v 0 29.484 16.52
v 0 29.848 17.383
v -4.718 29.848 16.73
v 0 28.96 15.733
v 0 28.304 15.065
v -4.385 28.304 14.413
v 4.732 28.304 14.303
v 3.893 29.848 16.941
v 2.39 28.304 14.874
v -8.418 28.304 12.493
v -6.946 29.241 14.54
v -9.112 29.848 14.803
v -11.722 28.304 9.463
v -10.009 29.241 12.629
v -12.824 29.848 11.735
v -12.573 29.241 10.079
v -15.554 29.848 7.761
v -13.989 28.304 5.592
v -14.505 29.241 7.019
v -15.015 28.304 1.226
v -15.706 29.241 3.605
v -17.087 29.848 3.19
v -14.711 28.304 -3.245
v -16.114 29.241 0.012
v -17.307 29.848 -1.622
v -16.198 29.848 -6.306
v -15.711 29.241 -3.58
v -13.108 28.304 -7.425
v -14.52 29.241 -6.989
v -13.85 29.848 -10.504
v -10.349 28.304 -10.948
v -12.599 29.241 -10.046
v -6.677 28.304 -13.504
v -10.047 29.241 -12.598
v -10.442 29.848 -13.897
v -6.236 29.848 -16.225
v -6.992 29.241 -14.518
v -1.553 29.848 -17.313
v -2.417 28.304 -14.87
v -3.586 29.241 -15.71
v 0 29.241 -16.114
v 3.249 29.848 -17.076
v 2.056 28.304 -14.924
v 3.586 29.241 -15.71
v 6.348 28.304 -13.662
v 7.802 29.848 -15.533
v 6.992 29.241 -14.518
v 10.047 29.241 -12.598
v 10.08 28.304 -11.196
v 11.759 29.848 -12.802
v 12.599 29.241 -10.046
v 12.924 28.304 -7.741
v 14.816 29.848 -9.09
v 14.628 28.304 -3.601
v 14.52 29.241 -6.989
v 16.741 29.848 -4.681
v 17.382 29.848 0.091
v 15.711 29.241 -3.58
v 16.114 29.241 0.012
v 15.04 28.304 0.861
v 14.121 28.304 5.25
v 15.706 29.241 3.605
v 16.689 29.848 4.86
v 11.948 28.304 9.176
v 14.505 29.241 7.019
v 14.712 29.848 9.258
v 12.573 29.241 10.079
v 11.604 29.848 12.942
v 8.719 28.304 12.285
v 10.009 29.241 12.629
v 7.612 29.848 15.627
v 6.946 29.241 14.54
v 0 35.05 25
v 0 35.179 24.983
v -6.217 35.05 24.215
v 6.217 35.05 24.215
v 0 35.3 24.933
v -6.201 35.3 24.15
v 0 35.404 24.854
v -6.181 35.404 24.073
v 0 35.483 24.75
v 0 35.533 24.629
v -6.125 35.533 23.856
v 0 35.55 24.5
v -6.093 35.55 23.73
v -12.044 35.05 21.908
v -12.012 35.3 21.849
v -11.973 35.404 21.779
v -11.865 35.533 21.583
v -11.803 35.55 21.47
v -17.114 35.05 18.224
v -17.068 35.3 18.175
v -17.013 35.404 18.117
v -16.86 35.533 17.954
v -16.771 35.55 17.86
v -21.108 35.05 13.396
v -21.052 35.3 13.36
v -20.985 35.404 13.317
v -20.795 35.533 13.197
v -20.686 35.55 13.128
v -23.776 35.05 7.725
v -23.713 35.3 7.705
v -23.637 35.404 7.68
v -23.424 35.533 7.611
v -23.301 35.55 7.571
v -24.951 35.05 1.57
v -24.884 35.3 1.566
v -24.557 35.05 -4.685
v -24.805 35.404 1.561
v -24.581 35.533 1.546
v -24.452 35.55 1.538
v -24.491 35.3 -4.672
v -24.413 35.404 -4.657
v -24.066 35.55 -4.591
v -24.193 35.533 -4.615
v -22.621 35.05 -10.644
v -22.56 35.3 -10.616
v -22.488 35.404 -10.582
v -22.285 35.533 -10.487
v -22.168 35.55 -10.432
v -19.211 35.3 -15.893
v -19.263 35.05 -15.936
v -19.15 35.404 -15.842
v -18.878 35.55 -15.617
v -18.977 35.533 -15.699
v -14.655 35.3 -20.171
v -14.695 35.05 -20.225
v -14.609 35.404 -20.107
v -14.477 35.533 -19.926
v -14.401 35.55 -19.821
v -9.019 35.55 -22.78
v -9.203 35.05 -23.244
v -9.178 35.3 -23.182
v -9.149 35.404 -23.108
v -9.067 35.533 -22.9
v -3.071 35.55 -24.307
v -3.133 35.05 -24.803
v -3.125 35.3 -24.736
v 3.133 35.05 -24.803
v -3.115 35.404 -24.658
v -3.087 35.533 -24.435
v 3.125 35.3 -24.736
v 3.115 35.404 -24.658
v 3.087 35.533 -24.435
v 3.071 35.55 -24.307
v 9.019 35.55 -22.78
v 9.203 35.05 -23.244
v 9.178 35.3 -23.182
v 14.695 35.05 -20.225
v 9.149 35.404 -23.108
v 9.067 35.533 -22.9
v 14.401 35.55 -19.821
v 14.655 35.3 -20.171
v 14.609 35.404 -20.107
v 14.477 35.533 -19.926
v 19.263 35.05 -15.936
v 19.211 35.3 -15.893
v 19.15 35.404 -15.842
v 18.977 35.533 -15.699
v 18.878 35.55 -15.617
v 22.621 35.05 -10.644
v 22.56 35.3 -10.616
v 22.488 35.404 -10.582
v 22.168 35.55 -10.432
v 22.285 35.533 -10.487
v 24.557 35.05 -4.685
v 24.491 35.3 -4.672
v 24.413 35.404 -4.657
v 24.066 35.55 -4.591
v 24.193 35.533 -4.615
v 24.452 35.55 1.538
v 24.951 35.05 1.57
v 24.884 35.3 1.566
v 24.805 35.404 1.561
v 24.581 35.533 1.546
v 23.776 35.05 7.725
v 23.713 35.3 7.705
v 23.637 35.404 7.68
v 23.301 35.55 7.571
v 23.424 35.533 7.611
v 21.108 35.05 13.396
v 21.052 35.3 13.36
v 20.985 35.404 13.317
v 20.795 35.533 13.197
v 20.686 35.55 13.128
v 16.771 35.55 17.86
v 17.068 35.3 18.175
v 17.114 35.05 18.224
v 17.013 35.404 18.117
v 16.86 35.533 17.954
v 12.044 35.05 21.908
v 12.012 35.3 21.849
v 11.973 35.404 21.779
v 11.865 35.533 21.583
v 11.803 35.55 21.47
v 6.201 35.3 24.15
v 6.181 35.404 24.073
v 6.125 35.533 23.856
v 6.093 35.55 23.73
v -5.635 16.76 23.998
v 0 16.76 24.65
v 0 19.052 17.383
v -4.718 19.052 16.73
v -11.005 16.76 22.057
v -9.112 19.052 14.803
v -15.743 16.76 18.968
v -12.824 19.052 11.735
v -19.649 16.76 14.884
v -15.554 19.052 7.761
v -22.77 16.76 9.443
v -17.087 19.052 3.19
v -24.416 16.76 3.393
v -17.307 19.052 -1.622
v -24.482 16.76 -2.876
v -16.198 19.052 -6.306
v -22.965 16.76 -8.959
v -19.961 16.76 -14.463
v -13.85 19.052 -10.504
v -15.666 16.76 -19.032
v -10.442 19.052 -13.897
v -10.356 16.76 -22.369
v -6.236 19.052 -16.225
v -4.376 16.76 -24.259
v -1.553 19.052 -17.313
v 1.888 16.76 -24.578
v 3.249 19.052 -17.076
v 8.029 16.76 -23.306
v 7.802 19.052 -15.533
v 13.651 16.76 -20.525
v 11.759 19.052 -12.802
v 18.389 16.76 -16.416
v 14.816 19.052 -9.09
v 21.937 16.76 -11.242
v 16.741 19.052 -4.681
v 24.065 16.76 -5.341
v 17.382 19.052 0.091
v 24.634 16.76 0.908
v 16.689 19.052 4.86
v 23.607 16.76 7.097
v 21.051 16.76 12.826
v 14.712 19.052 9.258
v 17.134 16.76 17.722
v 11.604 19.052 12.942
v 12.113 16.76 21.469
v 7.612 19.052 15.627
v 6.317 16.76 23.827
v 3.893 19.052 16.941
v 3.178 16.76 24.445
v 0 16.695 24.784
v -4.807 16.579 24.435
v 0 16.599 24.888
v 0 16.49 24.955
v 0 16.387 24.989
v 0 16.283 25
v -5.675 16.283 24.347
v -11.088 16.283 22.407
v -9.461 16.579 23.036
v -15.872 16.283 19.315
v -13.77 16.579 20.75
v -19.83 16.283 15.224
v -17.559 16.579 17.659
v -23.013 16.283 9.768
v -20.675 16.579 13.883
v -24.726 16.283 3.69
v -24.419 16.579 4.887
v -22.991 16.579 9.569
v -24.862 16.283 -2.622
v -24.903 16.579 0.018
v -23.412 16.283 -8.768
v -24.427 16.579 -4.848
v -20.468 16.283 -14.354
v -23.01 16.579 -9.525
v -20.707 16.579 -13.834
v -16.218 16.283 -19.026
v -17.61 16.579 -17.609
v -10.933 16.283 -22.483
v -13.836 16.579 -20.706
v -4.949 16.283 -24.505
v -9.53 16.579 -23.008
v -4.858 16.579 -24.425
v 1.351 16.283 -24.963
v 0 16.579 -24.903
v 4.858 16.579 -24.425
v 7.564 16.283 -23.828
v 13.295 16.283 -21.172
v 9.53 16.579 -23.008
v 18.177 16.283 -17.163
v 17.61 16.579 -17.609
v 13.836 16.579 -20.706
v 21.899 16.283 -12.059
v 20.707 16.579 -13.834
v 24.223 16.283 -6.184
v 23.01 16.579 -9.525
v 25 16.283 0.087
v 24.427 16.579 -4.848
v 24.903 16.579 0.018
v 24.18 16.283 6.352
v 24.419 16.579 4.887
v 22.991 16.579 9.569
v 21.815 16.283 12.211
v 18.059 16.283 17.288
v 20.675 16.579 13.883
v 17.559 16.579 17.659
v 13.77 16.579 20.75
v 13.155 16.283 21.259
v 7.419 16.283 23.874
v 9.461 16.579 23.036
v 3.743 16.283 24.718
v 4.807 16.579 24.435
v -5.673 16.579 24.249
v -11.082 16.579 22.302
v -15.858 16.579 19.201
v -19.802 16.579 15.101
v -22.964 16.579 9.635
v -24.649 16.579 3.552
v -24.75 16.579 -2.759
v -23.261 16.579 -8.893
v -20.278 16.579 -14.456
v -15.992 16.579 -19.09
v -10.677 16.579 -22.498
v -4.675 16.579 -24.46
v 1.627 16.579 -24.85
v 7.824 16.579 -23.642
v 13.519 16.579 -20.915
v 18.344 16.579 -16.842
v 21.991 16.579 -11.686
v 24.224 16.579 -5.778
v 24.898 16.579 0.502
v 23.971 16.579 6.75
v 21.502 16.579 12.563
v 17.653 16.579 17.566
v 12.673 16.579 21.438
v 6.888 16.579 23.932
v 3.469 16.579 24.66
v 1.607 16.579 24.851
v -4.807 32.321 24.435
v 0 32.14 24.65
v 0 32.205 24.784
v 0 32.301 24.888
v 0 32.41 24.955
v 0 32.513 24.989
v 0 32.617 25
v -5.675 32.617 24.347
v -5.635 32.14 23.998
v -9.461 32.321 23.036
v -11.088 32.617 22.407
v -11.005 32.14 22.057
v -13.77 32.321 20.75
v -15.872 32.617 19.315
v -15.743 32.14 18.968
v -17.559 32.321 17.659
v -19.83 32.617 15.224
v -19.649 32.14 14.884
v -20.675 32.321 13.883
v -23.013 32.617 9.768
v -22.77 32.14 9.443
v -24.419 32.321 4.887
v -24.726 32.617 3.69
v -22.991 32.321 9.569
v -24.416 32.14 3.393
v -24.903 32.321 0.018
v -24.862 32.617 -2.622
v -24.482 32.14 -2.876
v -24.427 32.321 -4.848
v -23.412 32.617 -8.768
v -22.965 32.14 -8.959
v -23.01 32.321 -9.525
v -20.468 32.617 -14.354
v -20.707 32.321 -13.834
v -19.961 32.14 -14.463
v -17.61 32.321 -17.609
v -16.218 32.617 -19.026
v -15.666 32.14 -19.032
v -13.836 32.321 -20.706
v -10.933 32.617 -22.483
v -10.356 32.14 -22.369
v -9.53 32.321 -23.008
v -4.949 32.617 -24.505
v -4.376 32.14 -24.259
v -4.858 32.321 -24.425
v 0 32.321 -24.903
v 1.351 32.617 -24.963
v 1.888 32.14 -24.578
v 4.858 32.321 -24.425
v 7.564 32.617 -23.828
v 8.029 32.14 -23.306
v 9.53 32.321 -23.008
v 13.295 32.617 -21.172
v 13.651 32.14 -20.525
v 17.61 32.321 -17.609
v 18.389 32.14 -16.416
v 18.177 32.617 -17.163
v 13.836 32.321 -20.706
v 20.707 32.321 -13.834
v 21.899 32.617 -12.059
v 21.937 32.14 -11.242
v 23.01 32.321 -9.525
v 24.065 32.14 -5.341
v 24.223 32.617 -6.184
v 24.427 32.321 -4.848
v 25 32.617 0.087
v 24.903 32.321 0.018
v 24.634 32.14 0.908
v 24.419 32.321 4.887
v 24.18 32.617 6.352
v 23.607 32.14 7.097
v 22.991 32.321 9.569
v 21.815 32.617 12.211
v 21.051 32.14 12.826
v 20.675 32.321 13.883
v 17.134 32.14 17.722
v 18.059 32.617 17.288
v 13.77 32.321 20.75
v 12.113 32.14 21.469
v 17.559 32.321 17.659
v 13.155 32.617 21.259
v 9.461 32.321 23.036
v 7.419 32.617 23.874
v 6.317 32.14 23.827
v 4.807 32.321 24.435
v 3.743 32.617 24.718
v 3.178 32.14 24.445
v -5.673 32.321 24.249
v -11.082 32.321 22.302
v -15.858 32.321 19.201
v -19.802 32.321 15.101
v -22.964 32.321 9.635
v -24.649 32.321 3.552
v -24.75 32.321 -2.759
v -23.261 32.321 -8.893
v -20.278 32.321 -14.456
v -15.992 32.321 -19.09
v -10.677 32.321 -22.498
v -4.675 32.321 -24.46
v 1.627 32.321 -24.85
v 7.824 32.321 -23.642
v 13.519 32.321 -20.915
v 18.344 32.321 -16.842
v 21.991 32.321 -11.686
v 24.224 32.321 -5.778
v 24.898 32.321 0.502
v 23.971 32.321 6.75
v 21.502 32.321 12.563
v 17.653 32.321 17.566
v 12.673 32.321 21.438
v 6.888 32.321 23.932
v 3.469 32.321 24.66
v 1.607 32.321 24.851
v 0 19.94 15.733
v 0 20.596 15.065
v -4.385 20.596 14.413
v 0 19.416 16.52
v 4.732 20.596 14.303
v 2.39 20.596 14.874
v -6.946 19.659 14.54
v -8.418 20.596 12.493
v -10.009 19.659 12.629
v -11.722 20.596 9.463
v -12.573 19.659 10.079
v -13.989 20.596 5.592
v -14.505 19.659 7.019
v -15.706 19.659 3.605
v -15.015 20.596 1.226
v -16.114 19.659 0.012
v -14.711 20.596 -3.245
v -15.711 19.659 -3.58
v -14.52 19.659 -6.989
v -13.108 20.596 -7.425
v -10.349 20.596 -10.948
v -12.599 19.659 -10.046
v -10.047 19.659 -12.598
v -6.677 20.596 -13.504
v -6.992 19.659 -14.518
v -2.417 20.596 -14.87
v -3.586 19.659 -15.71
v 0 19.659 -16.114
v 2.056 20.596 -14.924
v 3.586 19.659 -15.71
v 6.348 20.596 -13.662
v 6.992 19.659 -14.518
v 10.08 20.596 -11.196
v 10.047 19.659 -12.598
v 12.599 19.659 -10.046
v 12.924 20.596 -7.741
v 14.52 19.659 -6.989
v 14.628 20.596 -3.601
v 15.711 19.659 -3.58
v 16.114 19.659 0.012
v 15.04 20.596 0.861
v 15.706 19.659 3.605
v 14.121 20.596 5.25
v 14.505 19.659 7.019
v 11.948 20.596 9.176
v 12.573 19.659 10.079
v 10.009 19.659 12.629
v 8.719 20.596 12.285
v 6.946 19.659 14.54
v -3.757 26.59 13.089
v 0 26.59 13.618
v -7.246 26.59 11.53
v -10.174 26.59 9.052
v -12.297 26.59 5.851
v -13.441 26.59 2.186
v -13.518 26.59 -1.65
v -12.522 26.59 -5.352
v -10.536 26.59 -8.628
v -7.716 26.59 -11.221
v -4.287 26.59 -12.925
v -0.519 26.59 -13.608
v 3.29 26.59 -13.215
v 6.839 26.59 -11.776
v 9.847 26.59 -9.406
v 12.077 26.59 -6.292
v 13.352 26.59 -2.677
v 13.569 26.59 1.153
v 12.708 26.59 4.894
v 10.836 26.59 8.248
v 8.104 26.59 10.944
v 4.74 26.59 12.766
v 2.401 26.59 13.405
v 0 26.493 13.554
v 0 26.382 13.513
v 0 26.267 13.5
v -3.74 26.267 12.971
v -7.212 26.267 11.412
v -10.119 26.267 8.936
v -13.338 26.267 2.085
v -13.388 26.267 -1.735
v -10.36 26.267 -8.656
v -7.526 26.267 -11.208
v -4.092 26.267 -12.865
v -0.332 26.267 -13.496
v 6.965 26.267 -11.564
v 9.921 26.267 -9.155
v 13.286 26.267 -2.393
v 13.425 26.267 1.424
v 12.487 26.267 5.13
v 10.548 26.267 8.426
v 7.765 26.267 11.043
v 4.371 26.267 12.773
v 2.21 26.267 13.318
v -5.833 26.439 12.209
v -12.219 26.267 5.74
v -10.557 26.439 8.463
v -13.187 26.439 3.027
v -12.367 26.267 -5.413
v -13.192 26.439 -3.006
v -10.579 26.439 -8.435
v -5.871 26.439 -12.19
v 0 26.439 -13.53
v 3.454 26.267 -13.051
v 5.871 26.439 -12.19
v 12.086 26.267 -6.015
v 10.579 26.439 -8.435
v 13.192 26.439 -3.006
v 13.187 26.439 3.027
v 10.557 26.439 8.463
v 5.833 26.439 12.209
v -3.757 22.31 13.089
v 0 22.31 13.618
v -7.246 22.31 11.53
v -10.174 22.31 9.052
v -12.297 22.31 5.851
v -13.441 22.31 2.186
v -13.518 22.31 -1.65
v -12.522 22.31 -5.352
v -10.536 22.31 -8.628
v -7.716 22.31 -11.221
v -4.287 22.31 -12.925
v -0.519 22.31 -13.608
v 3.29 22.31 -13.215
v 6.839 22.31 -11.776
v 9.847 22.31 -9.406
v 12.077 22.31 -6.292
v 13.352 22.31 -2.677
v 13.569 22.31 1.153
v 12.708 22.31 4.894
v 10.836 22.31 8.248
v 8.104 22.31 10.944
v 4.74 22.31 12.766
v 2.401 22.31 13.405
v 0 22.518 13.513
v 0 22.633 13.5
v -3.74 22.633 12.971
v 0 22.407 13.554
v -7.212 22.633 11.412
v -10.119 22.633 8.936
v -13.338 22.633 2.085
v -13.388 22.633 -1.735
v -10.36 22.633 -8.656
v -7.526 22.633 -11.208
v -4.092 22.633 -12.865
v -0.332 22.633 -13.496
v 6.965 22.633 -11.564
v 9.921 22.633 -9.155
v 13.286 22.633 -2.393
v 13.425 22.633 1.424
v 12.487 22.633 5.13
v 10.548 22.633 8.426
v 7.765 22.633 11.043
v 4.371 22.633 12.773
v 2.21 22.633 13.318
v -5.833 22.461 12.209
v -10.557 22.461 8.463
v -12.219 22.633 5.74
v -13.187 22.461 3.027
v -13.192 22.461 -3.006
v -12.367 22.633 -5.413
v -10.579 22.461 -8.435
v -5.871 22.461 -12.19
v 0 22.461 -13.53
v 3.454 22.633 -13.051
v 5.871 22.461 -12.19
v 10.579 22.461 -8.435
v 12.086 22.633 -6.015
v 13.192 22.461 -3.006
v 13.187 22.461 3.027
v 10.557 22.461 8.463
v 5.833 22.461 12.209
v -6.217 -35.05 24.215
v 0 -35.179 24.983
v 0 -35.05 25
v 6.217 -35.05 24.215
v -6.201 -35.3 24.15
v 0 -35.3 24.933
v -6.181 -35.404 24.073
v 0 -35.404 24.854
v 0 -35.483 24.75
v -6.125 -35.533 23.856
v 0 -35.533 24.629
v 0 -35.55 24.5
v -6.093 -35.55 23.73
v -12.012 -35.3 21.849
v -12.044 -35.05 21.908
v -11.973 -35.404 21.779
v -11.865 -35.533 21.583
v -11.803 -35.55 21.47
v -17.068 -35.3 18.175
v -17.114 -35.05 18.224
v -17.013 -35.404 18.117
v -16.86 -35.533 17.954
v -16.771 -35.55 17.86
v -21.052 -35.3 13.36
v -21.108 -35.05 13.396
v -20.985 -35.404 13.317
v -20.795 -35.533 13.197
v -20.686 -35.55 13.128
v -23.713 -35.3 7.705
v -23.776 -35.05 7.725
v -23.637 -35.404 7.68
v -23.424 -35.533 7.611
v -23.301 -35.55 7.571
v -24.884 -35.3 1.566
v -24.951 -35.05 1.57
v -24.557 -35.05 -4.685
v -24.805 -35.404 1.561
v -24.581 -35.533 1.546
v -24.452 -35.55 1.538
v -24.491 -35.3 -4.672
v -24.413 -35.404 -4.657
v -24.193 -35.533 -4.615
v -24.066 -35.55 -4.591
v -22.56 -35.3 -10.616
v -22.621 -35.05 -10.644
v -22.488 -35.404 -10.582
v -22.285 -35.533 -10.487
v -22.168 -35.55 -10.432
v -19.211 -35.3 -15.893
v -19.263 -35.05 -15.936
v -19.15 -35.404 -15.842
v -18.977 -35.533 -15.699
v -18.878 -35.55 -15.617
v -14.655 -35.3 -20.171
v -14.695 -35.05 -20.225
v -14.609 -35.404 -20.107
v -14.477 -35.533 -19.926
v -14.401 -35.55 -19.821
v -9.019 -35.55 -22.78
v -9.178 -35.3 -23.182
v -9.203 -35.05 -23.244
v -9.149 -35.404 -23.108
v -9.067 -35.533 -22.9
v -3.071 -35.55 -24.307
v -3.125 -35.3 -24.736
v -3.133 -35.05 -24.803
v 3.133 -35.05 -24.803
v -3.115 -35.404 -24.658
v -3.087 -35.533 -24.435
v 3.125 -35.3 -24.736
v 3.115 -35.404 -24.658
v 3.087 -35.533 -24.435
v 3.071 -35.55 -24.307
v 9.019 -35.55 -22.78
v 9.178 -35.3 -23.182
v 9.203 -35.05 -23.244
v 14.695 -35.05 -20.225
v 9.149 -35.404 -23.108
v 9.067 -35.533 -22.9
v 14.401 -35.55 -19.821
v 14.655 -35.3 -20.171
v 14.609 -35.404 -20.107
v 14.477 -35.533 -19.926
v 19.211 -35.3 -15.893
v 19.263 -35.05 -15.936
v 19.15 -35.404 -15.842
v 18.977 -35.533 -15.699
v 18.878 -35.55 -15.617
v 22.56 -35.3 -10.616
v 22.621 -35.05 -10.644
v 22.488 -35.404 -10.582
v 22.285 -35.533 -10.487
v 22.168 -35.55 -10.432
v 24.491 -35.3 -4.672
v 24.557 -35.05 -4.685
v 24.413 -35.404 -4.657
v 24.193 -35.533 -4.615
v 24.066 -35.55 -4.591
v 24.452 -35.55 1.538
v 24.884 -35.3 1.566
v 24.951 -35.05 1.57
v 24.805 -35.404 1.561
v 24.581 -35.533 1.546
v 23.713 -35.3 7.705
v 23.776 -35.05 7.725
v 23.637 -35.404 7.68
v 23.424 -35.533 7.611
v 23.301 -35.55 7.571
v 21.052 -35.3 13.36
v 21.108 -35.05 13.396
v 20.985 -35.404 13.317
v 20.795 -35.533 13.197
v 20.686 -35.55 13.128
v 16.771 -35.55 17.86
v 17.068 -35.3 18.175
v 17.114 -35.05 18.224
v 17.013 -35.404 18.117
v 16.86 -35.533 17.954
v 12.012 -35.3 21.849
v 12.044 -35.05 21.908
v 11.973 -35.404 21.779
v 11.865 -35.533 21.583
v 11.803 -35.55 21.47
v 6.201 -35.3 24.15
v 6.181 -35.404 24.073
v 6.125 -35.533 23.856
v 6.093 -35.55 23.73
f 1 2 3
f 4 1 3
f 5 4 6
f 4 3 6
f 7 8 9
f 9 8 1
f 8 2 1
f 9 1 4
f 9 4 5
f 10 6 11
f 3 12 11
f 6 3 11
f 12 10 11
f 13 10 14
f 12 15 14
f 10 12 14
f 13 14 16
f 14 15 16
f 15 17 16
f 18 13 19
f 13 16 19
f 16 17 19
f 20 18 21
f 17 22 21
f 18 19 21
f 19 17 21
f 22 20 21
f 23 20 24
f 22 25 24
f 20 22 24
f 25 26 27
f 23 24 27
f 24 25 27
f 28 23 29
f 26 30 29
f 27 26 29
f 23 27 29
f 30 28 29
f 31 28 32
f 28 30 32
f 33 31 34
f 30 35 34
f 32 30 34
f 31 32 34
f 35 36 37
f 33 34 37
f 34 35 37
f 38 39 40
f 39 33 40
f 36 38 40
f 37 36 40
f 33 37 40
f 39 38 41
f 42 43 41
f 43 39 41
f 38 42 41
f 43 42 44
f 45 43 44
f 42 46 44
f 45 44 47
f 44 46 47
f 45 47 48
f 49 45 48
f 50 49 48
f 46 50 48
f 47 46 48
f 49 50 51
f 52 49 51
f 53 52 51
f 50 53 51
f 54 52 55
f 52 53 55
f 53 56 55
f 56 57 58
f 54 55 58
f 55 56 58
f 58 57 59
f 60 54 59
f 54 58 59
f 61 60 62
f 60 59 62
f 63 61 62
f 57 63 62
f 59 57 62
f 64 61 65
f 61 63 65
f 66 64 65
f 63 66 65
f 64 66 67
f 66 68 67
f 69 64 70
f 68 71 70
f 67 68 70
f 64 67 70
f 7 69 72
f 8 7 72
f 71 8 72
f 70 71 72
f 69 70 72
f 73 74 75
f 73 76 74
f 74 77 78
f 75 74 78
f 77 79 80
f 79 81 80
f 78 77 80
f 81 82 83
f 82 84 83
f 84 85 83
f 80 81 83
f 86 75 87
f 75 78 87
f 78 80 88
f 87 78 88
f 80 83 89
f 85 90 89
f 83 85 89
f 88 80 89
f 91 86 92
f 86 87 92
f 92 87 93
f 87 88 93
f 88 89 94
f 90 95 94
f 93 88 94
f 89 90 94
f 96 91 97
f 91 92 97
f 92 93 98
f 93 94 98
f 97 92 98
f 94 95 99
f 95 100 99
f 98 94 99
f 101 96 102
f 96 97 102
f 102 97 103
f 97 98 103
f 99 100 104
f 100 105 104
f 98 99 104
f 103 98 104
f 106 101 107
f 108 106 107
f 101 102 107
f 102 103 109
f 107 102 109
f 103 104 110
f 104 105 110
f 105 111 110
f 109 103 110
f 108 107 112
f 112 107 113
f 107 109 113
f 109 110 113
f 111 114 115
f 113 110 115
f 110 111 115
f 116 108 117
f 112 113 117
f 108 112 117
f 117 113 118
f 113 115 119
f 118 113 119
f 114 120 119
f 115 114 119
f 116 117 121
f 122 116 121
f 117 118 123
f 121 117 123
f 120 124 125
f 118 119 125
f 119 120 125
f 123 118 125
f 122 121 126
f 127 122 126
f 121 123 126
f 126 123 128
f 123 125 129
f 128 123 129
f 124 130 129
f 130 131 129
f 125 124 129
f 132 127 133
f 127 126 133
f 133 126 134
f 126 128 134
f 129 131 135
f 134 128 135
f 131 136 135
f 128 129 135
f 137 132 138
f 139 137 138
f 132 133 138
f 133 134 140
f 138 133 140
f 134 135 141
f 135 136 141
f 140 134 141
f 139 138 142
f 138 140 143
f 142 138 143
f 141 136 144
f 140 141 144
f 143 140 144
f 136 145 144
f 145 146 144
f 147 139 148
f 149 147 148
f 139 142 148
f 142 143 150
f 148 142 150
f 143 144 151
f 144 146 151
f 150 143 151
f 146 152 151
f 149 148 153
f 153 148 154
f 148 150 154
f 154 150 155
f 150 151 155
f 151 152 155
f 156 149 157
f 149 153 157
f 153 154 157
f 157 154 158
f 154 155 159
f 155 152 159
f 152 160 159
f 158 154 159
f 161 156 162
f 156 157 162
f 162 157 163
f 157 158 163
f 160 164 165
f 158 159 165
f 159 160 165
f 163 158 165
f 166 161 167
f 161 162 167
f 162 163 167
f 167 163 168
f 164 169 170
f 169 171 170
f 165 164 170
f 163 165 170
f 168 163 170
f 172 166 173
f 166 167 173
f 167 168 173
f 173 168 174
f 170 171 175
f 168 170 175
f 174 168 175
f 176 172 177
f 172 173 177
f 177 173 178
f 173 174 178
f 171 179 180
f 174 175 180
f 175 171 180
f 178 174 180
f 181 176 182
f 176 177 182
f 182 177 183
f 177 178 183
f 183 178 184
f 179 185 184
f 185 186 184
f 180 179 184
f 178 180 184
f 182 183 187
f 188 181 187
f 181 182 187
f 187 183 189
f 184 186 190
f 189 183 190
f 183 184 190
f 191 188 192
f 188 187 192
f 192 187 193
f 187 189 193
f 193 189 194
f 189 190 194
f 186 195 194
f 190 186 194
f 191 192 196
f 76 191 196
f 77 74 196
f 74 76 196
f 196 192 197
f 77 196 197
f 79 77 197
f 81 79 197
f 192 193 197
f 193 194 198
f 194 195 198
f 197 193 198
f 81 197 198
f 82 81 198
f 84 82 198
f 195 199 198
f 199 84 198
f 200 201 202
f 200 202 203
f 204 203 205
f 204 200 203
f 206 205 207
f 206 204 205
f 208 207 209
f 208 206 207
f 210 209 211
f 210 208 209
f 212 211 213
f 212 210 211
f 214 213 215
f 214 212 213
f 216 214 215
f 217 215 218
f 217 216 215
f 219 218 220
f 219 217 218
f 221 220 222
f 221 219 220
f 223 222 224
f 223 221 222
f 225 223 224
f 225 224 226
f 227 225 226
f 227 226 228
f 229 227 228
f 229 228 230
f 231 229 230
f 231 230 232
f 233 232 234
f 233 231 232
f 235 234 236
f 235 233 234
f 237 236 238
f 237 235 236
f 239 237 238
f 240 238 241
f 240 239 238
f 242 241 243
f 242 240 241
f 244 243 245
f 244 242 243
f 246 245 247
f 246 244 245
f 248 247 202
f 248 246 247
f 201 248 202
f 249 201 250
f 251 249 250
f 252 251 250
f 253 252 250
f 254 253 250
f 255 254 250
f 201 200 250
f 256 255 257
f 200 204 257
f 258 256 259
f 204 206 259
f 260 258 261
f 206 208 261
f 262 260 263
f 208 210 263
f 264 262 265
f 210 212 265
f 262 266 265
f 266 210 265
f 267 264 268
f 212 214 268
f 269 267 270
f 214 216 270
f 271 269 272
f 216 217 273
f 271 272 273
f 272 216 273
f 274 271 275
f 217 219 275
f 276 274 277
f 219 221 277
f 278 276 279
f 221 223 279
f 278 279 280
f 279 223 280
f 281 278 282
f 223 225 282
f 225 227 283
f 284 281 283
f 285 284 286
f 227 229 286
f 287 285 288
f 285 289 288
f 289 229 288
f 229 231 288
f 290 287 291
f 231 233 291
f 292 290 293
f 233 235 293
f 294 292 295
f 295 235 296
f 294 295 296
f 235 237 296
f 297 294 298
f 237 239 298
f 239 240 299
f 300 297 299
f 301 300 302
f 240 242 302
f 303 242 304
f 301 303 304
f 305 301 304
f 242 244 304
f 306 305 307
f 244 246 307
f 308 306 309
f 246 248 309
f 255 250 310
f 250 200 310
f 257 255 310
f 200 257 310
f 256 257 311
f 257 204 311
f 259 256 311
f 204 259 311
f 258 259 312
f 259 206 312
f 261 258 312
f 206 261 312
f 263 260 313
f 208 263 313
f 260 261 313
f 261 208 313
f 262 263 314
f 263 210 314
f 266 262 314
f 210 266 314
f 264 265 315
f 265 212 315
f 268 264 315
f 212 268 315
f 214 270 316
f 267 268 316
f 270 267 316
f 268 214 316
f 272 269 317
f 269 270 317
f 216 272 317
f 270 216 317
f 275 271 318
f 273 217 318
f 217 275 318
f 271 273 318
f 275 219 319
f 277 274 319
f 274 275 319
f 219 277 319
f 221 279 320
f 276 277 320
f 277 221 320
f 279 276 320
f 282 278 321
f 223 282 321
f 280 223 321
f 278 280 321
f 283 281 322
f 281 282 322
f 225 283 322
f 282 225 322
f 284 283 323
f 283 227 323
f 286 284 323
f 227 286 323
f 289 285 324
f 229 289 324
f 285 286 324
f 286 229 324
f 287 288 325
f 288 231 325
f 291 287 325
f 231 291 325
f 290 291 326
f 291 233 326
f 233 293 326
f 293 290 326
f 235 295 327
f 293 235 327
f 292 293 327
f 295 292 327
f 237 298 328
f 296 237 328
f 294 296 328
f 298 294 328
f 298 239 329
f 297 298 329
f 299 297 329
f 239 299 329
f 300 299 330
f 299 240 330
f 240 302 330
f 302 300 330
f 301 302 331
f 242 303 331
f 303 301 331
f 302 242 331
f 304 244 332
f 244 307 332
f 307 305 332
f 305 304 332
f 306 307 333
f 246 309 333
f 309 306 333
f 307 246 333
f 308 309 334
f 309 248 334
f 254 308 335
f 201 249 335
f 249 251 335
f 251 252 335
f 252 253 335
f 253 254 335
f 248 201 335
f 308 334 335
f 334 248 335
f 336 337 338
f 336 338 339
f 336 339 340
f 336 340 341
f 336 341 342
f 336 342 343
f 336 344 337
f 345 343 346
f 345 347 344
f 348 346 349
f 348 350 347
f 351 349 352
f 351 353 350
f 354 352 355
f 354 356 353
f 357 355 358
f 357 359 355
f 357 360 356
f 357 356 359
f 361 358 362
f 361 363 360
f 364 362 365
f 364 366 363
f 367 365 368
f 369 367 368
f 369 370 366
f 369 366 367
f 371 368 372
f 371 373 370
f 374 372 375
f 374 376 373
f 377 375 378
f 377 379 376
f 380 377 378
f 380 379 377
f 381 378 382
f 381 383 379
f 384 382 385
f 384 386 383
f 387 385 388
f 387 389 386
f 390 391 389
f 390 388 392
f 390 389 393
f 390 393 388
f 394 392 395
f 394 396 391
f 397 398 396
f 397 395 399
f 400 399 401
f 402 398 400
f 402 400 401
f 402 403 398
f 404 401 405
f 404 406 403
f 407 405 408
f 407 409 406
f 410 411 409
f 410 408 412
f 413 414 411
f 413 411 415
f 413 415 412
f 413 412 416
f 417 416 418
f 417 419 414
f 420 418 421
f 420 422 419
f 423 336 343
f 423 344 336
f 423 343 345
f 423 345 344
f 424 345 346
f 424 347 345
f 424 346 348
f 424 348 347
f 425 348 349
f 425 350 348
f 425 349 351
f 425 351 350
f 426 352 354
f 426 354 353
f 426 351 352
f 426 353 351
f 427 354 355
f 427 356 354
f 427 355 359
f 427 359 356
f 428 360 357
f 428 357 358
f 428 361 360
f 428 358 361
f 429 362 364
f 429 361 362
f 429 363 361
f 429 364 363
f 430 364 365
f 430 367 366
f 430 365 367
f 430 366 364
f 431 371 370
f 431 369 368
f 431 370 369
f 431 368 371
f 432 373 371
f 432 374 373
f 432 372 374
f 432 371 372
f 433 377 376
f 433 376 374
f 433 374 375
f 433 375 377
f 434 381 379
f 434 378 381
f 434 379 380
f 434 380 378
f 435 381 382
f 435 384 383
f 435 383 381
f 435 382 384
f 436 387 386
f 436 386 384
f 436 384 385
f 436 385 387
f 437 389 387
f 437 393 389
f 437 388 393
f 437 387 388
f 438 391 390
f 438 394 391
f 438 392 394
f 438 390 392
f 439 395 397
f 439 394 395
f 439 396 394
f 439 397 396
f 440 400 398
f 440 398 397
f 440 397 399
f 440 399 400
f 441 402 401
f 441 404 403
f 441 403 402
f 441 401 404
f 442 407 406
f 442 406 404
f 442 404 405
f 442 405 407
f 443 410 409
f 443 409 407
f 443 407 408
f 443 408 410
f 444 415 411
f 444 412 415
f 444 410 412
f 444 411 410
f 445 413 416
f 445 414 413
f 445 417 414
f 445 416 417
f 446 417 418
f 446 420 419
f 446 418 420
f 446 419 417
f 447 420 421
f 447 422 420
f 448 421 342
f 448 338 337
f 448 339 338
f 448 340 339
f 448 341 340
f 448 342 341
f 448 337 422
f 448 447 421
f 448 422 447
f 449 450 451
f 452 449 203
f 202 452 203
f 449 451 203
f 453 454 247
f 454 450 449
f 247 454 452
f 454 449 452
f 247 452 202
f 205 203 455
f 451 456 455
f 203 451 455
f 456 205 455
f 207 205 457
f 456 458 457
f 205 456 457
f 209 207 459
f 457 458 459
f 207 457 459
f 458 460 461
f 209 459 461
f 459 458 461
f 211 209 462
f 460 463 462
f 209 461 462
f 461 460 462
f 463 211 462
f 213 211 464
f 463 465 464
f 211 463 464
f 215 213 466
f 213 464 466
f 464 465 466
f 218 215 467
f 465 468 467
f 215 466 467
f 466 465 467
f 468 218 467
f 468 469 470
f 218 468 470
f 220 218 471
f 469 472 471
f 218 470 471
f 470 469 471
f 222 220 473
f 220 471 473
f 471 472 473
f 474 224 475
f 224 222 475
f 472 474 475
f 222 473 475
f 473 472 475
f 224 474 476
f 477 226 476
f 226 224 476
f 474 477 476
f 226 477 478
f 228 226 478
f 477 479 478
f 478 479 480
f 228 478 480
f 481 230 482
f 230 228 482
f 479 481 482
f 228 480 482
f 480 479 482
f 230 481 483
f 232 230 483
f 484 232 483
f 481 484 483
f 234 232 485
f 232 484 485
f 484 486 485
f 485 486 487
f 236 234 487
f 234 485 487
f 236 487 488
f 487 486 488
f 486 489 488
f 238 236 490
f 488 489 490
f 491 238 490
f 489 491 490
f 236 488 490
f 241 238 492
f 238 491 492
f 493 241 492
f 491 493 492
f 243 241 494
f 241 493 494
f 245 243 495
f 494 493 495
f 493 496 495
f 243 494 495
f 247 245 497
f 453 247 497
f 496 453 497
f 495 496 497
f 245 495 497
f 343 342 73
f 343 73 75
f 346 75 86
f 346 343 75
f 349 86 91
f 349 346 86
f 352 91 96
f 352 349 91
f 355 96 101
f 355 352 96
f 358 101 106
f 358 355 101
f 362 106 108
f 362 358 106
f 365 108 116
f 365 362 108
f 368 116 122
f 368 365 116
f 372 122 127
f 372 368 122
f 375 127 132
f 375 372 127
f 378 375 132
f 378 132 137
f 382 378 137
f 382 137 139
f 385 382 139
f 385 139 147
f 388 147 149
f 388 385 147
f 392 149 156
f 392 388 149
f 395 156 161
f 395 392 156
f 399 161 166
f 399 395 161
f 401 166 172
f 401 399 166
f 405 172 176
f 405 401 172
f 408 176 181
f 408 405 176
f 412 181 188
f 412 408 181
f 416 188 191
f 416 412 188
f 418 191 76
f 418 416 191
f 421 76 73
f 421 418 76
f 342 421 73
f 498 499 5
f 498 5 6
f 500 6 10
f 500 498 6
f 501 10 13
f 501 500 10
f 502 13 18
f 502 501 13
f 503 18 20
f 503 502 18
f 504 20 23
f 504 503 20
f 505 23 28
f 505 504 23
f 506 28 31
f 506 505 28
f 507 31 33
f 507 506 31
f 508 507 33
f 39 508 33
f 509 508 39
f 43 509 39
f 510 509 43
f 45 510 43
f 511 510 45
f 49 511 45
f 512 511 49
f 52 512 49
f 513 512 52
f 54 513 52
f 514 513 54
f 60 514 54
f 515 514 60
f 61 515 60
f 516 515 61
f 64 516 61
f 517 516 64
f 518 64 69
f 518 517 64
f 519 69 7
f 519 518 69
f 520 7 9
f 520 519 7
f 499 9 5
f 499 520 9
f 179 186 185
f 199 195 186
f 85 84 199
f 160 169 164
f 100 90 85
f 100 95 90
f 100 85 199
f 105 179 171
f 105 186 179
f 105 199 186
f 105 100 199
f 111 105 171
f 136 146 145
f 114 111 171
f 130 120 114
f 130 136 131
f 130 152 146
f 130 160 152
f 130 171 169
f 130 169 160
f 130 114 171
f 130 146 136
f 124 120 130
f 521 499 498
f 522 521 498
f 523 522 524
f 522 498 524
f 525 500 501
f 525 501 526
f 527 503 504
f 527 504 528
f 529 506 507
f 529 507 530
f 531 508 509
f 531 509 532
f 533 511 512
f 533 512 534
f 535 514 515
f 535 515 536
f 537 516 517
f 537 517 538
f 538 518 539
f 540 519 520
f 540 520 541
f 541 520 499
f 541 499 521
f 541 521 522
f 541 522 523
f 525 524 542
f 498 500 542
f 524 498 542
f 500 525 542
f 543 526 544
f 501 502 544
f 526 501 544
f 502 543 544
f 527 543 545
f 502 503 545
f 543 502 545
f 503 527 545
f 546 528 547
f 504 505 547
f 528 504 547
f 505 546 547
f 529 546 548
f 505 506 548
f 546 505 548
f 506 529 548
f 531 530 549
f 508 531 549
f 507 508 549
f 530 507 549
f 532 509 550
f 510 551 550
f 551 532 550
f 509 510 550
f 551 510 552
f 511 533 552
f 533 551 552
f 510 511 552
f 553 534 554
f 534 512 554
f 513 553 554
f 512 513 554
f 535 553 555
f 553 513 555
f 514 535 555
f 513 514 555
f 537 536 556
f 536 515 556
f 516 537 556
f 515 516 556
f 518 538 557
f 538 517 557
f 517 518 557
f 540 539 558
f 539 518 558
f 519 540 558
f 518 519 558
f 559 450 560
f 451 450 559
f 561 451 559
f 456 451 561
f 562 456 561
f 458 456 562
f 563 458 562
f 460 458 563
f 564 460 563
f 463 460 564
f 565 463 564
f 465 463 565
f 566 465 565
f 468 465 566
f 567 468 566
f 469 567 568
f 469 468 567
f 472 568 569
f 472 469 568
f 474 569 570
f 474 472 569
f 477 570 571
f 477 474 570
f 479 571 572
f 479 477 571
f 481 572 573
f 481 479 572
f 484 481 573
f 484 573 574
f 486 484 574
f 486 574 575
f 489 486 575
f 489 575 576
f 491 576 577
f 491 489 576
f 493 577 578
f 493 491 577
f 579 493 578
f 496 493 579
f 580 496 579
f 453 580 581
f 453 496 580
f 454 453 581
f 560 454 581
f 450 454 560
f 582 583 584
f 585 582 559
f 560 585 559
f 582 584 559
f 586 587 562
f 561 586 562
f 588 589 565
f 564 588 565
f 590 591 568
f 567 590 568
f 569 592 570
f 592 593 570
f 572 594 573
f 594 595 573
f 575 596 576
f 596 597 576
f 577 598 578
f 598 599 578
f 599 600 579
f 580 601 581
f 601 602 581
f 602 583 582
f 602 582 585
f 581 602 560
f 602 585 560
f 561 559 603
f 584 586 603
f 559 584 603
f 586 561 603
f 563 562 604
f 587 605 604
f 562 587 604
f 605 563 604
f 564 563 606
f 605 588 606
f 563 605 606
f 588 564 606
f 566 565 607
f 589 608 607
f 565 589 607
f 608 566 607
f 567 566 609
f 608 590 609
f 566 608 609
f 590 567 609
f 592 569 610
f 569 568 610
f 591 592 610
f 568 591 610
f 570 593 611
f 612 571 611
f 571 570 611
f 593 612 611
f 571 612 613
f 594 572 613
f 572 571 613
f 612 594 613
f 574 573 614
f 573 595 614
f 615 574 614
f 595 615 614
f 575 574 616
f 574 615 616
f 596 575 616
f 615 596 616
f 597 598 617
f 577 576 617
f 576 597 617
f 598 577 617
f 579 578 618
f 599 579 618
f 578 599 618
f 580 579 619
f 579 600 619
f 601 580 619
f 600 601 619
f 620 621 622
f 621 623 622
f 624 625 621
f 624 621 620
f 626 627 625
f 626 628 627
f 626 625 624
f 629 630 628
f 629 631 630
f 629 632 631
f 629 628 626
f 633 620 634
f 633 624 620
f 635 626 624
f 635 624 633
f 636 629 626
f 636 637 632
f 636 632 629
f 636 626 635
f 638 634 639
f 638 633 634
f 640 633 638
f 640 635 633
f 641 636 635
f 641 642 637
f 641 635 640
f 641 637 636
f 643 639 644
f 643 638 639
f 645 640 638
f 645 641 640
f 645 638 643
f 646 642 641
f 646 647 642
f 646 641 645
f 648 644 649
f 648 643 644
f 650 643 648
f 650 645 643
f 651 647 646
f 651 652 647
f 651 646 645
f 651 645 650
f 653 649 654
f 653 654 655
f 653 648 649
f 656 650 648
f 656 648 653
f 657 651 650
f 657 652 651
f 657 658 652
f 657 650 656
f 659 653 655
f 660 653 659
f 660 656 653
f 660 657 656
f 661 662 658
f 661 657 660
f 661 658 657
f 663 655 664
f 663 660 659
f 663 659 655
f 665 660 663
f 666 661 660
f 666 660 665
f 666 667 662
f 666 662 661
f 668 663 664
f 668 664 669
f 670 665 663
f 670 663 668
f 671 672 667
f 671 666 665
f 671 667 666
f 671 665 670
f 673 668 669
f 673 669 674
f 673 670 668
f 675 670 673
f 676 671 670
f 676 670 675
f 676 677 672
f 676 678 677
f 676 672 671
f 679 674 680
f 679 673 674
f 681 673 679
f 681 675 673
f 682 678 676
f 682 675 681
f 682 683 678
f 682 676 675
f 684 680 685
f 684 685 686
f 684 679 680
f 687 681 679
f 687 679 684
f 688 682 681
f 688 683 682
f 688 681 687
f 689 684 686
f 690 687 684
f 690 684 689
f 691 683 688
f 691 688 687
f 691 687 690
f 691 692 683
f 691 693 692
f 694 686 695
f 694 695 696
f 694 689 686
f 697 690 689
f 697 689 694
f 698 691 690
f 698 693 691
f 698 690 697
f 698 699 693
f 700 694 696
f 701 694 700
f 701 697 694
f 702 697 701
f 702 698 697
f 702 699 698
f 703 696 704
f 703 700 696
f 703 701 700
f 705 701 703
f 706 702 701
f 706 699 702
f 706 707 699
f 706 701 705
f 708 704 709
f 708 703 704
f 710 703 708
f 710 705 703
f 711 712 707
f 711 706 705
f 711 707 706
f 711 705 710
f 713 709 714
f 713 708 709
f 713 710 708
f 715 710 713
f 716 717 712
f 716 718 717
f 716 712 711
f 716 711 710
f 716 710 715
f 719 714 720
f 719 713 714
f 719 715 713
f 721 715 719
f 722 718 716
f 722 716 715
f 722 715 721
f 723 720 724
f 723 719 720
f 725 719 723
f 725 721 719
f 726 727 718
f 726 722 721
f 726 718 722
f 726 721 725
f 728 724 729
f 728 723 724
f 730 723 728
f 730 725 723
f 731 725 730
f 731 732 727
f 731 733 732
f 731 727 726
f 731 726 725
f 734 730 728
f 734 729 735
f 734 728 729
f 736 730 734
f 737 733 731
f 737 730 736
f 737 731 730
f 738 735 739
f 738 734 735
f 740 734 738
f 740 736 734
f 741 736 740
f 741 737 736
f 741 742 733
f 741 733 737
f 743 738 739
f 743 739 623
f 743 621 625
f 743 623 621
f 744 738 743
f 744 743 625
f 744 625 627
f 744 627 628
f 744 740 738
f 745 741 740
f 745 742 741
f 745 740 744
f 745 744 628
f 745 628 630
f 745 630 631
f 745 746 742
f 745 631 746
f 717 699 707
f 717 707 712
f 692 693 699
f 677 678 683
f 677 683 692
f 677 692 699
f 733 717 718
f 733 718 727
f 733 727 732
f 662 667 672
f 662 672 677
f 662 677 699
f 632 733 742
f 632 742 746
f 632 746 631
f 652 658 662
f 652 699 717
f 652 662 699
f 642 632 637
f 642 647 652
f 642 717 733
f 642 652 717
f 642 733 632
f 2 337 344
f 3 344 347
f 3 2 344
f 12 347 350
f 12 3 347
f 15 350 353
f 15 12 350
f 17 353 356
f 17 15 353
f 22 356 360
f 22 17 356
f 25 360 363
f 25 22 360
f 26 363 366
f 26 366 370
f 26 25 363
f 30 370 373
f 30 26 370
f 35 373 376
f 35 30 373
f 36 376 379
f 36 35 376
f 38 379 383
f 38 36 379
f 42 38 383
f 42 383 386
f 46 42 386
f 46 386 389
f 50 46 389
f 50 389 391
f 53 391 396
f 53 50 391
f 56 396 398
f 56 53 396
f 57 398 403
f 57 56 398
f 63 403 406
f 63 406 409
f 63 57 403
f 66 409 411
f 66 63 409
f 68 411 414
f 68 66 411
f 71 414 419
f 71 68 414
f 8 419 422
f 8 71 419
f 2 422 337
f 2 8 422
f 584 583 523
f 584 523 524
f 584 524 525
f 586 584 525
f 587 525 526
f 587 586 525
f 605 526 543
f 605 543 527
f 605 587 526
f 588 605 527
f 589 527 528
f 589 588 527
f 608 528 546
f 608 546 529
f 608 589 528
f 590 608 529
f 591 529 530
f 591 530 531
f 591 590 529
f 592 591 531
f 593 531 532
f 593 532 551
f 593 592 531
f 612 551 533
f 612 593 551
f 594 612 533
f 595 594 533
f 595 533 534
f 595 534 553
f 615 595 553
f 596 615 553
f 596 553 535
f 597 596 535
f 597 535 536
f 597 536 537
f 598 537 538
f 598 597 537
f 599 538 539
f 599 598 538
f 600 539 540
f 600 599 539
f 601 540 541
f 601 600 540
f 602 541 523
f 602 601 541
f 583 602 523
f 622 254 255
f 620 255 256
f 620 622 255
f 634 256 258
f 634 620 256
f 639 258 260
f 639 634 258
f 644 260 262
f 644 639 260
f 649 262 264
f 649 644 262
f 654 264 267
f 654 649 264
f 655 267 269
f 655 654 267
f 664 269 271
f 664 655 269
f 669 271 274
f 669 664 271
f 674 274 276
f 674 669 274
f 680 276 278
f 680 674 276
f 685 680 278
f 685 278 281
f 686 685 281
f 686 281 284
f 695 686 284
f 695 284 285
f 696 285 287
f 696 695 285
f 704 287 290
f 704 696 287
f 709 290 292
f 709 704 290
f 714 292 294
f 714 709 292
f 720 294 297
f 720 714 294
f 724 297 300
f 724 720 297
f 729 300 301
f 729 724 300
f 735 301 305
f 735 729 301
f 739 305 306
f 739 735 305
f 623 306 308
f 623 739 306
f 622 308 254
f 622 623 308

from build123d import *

# Parameters (mm, degrees)
FILLET1_R = 5
FILLET2_R = 0.5


with BuildPart() as part:
    # Sketch1 → Revolve1 (revolve)
    with BuildSketch(Plane.XY, mode=Mode.PRIVATE) as revolve1_sk:
        Polygon((25, 32.25), (16, 29.4123109), (13.5, 26.45), (13.5, 22.45), (16, 19.4876891), (25, 16.65), (25, -35.55), (0, -35.55), (0, 35.55), (25, 35.55), align=None)
    revolve(revolve1_sk.sketch.rotate(Axis((0, 67.092271098, 0), (0, -1, 0)), 90), axis=Axis((0, 67.092271098, 0), (0, -1, 0)))

    # Fillet1
    fillet1_edges = [part.edges().sort_by_distance(p)[0] for p in [
        (0, 19.4876891, -16),
        (0, 29.4123109, -16),
    ]]
    fillet(fillet1_edges, radius=FILLET1_R)

    # Fillet2
    fillet2_edges = [part.edges().sort_by_distance(p)[0] for p in [
        (0, 16.65, -25),
        (0, -35.55, -25),
        (0, 35.55, -25),
        (0, 32.25, -25),
        (0, 26.45, -13.5),
        (0, 22.45, -13.5),
    ]]
    fillet(fillet2_edges, radius=FILLET2_R)


solid = part.part
